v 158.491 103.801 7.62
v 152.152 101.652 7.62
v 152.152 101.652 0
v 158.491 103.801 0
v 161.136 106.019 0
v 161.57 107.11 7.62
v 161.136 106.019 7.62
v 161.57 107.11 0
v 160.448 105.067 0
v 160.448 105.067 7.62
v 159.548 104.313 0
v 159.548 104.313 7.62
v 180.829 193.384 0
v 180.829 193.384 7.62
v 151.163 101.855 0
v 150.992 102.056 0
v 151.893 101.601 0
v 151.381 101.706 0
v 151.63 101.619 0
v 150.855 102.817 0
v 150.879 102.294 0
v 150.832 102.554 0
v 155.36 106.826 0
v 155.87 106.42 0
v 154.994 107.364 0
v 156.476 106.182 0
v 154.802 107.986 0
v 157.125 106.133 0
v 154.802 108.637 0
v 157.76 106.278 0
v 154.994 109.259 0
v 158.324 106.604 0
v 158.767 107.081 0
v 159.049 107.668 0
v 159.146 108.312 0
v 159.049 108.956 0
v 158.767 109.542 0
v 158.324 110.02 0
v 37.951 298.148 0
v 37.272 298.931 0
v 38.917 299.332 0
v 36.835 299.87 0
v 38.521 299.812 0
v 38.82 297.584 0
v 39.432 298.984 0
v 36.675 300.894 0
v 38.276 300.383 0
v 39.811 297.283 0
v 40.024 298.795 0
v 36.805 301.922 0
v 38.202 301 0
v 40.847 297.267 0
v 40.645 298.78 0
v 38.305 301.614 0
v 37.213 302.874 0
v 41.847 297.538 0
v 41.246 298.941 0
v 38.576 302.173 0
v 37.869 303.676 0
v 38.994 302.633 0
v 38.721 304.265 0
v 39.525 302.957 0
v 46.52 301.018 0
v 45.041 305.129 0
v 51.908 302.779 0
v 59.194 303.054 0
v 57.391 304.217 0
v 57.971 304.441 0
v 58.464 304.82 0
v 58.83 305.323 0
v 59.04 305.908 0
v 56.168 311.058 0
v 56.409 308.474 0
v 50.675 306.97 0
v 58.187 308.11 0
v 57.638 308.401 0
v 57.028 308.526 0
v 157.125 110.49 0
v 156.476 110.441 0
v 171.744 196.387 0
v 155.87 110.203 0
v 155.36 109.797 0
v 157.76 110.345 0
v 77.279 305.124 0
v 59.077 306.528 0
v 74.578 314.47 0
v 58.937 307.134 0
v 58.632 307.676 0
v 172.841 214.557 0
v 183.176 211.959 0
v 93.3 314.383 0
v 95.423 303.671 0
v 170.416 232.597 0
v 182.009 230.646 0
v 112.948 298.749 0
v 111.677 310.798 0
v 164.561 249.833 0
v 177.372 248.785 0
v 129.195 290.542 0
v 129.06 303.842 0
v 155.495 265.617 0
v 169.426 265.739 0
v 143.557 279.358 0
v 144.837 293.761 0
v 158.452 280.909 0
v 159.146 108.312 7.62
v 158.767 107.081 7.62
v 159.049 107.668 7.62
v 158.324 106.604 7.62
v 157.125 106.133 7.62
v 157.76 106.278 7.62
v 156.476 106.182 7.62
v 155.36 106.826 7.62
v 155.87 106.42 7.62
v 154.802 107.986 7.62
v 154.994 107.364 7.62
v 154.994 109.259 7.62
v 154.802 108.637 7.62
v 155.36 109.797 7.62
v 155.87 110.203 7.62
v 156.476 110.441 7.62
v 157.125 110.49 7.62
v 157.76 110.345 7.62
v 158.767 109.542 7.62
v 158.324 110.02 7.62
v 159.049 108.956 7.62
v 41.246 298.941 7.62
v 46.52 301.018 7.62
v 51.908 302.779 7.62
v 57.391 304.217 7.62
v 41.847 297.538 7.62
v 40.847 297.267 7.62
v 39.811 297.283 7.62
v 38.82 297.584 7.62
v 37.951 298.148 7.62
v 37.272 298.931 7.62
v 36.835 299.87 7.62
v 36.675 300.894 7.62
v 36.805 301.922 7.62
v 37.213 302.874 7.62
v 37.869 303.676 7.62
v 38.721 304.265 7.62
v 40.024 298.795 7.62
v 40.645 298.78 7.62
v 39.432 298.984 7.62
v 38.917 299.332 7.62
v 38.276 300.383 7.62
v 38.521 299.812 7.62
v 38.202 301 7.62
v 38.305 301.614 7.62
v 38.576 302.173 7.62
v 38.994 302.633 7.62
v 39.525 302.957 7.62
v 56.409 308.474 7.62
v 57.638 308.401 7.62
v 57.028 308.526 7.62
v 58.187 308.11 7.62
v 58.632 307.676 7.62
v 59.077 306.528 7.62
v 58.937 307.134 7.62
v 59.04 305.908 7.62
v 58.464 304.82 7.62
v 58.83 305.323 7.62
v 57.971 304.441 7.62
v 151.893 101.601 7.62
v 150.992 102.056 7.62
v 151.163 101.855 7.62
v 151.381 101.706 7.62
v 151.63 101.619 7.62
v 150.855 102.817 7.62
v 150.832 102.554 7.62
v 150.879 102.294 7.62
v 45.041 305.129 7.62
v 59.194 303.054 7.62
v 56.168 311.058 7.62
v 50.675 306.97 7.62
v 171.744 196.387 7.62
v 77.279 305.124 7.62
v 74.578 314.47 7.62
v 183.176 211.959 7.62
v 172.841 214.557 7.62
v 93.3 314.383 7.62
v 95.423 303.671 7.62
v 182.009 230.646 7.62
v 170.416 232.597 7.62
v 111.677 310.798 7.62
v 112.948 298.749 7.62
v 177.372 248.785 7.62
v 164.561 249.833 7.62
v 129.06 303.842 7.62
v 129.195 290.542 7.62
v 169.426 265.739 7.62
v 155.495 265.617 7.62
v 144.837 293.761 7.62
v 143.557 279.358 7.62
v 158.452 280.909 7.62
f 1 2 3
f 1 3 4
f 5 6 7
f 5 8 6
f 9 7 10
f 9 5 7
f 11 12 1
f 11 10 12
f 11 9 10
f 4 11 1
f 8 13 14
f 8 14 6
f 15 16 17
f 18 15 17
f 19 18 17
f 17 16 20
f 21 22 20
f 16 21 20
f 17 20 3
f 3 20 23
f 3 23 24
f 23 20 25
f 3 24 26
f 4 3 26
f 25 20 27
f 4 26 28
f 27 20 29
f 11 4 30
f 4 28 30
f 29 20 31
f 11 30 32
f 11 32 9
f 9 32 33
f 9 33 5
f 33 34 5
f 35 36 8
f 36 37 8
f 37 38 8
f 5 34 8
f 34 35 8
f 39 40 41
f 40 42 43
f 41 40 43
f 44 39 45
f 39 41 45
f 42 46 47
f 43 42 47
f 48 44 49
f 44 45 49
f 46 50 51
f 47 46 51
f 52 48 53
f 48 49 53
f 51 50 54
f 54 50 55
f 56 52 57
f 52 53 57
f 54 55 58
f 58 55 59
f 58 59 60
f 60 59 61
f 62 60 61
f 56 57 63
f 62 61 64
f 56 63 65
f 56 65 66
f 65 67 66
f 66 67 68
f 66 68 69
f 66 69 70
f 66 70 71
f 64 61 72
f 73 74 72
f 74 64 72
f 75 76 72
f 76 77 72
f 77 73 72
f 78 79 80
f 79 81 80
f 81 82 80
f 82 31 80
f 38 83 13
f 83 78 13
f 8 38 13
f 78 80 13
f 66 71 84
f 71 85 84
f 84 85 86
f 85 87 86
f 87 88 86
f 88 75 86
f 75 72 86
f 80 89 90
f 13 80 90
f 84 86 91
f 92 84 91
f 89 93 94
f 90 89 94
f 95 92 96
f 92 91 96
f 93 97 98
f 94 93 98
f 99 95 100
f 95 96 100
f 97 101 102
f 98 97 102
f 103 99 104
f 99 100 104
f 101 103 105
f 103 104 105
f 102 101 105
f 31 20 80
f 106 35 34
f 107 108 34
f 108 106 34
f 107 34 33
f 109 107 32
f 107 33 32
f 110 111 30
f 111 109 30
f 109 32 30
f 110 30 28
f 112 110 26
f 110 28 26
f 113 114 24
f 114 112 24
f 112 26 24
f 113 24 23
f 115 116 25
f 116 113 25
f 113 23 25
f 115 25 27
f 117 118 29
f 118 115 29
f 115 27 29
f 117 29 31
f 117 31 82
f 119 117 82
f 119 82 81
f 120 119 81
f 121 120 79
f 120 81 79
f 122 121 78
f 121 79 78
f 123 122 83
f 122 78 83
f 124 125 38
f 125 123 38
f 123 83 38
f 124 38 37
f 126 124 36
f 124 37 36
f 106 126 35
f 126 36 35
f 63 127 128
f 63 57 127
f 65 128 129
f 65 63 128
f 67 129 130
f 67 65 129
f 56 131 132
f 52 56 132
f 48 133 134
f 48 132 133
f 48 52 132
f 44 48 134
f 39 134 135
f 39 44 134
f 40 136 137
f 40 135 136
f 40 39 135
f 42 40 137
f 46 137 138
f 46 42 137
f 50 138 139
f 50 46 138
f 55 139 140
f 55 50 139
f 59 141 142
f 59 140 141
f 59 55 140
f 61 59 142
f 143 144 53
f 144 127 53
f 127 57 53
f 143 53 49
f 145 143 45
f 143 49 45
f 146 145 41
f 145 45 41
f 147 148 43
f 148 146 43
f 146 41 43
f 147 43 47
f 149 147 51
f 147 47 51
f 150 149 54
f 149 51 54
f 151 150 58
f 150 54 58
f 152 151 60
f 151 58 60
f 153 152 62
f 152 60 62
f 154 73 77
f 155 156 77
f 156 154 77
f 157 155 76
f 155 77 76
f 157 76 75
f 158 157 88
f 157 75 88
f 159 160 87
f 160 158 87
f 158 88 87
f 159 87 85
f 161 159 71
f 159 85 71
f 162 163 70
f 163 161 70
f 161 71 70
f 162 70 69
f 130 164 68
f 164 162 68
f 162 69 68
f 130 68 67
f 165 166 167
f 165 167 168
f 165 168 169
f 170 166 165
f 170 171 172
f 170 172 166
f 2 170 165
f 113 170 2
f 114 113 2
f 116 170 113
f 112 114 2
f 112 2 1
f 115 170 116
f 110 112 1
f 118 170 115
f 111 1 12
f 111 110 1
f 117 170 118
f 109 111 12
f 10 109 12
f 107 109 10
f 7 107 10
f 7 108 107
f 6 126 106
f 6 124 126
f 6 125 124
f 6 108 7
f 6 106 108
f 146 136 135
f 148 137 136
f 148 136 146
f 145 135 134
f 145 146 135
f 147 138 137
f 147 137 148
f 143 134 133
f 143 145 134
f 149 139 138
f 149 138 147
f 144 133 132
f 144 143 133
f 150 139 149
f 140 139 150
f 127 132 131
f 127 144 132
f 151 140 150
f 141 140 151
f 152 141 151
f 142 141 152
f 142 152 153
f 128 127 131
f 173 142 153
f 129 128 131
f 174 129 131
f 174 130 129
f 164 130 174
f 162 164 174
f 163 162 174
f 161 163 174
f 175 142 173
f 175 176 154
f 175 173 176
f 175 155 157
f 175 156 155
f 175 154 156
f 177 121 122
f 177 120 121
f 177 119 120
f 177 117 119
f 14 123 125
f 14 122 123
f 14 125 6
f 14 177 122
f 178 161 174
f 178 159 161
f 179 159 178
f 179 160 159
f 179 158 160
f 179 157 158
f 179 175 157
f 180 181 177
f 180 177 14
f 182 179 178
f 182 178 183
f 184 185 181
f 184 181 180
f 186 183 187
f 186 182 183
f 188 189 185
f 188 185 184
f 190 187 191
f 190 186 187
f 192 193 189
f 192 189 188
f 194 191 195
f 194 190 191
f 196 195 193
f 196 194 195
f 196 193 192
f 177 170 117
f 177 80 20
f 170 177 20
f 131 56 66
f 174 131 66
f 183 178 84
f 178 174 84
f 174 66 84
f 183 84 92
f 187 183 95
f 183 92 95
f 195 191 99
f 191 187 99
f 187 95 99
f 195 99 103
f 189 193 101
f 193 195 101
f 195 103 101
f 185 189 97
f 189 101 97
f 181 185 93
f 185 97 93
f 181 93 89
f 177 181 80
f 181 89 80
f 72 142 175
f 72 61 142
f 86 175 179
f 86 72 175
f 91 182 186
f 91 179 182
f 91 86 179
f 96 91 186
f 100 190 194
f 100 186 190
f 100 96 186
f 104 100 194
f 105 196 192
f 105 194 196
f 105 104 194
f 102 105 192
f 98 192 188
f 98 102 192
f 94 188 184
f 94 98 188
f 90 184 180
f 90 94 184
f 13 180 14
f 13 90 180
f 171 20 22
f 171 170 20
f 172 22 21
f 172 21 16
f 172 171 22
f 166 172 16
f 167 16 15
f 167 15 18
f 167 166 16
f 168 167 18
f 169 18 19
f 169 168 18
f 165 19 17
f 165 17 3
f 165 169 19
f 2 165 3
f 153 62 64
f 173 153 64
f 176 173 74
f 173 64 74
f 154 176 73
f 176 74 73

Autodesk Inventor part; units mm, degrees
ref_plane "YZ Plane" through (0, 0, 0) normal (1, 0, 0) x (0, 1, 0)
ref_plane "XZ Plane" through (0, 0, 0) normal (0, 1, 0) x (-1, 0, 0)
ref_plane "XY Plane" through (0, 0, 0) normal (0, 0, 1) x (1, 0, 0)
sketch "Sketch1" plane through (0, 0, 0) normal (0, 0, 1) x (1, 0, 0)
  circle A0 centre (156.9617, 108.3117) radius 2.1844
  line L0 (171.7435, 196.3872) -> (150.4677, 101.0806)
  arc A1 (171.7435, 196.3872) -> (41.593, 297.4287) centre (78.8791, 211.1131) ccw
  arc A2 (152.3136, 109.3493) -> (161.5702, 107.1104) centre (156.9617, 108.3117) ccw
  line L1 (150.4677, 101.0806) -> (158.4911, 103.8014)
  line L2 (180.8293, 193.3835) -> (161.5702, 107.1104)
  circle A3 centre (40.3856, 300.9489) radius 2.1844 projected
  arc A4 (180.8293, 193.3835) -> (38.7207, 304.2652) centre (83.4742, 215.1165) ccw
  arc A5 (56.9002, 306.3451) -> (27.9409, 294.5249) centre (78.8791, 211.1131) ccw construction
  arc A6 (56.4089, 308.4736) -> (39.5252, 302.9567) centre (78.8791, 211.1131) ccw
  arc A7 (57.3914, 304.2167) -> (41.2459, 298.941) centre (78.8791, 211.1131) ccw
  arc A8 (57.3914, 304.2167) -> (56.4089, 308.4736) centre (56.9002, 306.3451) ccw
  arc A9 (39.5252, 302.9567) -> (41.2459, 298.941) centre (40.3856, 300.9489) ccw
  line L3 (83.4742, 215.1165) -> (56.9002, 306.3451) construction
  arc A10 (41.5411, 297.4113) -> (41.593, 297.4287) centre (40.3856, 300.9489) ccw
  line L4 (40.3856, 300.9489) -> (84.3253, 219.1399) construction
  arc A11 (38.7207, 304.2652) -> (42.1414, 297.6798) centre (40.3856, 300.9489) ccw
  line L5 (171.7435, 196.3872) -> (180.8293, 193.3835) construction
  point P0 (0, 0)
  point P1 (165.3829, 124.1896)
  point P2 (27.4473, 296.7796)
  point P3 (41.1972, 299.4378)
  point P4 (41.8471, 297.538)
  point P5 (41.2459, 298.941)
  point P6 (39.5252, 302.9567)
  dimension "d0" = 9.525
  dimension "d1" = 0
  dimension "d7" = 12
extrude "Extrusion1" add sketch "Sketch1" along normal blind 7.62
fillet "Fillet1" radius 1 1 edges at (150.4677, 101.0806, 3.81)
properties part number "front rails" material "Acetal Resin, Black"
